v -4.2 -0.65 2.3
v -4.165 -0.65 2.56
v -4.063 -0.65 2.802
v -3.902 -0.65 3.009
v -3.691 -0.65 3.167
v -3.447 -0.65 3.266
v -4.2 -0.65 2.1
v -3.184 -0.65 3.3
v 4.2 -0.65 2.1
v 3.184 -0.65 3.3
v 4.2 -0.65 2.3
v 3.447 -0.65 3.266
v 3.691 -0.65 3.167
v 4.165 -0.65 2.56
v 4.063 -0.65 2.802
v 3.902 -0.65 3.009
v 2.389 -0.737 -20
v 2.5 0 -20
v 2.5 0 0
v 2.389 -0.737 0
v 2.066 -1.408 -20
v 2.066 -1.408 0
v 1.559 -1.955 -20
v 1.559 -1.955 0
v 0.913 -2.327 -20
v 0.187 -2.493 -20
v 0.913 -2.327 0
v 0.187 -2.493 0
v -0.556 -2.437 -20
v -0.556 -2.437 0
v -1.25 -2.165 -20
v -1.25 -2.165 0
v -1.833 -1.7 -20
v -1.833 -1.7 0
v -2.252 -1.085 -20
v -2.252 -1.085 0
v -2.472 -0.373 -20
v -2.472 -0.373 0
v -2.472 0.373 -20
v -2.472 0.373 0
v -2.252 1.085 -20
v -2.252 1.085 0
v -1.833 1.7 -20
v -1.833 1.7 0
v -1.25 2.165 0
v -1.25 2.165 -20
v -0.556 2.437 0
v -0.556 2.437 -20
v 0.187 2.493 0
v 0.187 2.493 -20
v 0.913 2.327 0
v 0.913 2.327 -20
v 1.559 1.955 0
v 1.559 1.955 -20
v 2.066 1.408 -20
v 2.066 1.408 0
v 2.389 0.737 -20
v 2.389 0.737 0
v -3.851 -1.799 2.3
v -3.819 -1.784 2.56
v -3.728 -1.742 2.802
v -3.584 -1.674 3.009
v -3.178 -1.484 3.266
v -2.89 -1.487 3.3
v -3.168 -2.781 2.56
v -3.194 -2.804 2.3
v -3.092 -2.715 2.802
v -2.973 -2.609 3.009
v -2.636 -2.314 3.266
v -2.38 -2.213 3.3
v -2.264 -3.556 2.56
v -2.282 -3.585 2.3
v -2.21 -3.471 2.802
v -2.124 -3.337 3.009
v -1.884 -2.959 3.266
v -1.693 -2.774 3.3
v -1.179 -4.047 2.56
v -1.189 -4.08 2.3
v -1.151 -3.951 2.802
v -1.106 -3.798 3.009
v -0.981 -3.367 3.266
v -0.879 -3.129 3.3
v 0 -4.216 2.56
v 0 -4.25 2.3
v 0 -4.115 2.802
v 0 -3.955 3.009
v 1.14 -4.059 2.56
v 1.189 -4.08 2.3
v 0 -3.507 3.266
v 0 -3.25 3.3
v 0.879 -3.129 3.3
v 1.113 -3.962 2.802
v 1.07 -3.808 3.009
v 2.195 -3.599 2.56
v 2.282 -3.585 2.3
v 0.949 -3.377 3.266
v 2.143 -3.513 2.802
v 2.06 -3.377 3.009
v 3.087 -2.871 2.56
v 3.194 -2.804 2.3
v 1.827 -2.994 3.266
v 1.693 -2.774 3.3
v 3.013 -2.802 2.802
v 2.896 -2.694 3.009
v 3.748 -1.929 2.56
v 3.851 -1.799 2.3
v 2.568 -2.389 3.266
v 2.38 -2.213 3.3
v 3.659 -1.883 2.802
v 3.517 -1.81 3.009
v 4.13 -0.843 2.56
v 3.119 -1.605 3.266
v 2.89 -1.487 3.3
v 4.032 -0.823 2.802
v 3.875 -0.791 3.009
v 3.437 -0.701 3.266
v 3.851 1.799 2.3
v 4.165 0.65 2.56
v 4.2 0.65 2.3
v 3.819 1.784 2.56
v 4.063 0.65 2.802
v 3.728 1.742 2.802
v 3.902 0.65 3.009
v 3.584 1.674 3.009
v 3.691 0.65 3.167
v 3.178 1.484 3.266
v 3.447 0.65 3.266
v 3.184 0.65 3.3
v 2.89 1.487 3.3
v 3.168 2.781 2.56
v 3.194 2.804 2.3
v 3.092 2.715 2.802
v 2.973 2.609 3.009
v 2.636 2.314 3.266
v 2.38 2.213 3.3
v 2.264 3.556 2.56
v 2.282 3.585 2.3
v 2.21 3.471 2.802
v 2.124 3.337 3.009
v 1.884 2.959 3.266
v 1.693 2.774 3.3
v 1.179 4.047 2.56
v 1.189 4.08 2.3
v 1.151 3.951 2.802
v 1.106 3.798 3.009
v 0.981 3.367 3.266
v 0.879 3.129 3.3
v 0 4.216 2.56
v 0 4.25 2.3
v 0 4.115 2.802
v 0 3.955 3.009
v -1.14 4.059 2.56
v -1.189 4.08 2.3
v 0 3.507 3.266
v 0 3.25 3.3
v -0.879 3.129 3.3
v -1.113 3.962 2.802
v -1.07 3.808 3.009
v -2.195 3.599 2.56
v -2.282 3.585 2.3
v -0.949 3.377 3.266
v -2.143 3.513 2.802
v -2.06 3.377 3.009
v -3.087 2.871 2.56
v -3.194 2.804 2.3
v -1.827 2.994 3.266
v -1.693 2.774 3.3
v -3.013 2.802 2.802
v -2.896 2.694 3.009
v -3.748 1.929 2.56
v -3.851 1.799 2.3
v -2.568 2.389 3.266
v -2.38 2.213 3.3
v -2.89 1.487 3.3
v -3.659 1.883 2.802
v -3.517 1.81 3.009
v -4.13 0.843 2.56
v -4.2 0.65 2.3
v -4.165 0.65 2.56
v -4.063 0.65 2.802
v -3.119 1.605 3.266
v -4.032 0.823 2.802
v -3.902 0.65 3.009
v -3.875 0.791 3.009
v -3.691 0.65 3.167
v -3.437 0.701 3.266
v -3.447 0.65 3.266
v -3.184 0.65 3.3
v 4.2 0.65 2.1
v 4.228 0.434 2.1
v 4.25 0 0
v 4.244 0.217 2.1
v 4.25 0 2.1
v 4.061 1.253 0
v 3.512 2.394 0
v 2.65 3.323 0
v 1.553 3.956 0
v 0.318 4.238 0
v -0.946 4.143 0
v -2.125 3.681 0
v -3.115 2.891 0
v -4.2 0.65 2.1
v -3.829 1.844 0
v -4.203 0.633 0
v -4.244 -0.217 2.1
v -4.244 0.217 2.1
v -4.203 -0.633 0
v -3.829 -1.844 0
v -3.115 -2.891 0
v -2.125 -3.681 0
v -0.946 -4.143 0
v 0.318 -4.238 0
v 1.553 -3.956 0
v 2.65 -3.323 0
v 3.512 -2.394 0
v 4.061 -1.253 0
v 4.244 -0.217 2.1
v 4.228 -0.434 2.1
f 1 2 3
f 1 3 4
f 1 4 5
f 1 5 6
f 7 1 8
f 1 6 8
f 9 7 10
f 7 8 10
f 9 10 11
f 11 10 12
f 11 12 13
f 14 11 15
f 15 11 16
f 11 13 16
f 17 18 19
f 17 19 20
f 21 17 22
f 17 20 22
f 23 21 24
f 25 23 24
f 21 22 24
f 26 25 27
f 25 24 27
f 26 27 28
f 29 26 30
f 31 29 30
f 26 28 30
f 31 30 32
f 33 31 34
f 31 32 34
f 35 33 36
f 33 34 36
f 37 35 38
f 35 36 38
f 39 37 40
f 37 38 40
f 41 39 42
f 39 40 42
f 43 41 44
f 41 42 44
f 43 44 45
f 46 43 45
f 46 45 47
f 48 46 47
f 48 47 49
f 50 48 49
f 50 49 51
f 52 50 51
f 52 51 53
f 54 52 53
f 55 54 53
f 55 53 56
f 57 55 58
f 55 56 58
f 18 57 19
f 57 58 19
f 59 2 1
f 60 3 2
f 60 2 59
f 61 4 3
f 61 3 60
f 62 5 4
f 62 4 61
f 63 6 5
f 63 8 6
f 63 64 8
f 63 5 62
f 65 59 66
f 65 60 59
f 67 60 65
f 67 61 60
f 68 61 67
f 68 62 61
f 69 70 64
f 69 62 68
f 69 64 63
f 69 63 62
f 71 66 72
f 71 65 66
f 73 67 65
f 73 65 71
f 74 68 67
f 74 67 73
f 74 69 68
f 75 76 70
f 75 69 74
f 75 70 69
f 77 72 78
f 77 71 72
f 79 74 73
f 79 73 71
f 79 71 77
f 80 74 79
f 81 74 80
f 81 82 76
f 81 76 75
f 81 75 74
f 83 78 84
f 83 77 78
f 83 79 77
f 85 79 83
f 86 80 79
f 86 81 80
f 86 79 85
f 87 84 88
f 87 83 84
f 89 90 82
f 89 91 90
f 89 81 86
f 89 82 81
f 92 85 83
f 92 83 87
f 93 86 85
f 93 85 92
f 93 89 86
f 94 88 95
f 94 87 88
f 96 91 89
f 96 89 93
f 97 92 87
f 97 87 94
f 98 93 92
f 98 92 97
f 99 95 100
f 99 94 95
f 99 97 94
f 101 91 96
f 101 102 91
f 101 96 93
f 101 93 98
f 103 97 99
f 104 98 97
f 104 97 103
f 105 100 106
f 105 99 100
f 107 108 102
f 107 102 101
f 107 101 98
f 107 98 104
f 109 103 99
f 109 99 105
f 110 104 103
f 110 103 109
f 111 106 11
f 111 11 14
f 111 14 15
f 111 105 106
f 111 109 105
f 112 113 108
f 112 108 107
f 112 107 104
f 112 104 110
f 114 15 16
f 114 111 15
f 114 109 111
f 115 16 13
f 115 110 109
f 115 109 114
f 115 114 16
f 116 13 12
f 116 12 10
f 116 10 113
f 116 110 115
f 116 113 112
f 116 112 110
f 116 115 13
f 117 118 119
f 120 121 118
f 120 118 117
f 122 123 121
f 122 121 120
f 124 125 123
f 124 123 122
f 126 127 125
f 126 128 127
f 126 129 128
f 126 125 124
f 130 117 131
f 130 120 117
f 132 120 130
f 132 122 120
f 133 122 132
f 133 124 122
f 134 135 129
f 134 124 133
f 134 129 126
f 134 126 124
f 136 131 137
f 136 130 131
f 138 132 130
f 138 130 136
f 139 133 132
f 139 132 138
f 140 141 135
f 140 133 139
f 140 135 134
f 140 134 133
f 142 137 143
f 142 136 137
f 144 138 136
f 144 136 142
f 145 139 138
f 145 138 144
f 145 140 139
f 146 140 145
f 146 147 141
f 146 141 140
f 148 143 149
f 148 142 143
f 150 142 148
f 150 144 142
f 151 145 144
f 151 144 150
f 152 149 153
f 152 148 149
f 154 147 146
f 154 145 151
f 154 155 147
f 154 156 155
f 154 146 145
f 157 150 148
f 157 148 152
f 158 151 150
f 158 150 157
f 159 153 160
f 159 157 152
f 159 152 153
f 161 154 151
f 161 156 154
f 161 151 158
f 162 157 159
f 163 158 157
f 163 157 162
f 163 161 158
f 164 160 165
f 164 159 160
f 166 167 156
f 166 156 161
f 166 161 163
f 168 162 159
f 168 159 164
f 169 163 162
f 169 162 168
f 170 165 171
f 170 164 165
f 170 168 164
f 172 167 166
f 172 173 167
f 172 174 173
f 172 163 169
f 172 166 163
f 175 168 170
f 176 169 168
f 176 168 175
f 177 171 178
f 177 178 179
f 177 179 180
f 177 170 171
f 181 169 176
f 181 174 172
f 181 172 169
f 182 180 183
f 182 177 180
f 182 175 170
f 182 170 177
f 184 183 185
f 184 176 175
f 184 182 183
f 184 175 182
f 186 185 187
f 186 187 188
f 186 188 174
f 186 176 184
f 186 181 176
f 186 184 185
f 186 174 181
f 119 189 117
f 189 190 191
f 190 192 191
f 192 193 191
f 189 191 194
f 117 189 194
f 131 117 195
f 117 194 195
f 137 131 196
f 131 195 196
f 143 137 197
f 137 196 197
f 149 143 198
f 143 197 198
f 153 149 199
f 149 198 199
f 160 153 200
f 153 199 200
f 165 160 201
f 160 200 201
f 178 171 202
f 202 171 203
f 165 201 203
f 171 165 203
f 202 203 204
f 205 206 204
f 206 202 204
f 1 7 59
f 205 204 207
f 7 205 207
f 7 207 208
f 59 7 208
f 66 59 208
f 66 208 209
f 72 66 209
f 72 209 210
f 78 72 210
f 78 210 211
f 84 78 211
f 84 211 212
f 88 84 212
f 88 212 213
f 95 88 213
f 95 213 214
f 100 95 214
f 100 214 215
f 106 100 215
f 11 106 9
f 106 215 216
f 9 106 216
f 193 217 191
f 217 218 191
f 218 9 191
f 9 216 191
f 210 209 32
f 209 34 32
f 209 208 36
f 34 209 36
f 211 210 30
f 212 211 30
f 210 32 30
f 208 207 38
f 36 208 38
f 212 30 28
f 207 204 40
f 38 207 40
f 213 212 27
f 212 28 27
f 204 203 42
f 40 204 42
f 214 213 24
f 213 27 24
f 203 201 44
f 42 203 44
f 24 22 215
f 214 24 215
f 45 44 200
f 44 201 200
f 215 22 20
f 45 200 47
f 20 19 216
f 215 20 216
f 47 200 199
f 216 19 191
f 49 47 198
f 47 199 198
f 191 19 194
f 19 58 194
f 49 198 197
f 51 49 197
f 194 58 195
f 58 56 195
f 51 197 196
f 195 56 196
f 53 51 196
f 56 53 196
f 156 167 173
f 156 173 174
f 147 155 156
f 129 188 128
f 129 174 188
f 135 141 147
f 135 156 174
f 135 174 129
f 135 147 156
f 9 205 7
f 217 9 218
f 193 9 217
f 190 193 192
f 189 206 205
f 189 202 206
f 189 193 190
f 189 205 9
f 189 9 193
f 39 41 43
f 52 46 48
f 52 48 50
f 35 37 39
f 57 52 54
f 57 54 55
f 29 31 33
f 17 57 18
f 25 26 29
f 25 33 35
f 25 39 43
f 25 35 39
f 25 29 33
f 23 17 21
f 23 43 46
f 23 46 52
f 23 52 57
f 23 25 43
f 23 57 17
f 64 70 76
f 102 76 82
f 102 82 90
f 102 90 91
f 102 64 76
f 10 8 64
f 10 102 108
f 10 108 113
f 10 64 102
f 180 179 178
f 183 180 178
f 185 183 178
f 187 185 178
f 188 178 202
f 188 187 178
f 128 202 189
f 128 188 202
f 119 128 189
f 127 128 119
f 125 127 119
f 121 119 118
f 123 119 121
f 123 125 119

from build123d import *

# Parameters (mm, degrees)
F0_R     = 4.25
F1_DEPTH = 3.3
F2_R     = 2.5
F3_DEPTH = 20
F4_W     = 12.181458
F4_H     = 1.3
F5_DEPTH = 1.2
F6_R     = 1


with BuildPart() as f1:
    # F0 (on Top) → F1 (new body)
    with BuildSketch(Plane.XY):
        Circle(F0_R)
    extrude(amount=F1_DEPTH)

    # F2 (on face) → F3 (join)
    with BuildSketch(Plane(origin=(0, 0, 0), x_dir=(1, 0, 0), z_dir=(0, 0, -1))):
        Circle(F2_R)
    extrude(amount=F3_DEPTH)

    # F4 (on face) → F5 (cut)
    with BuildSketch(Plane.XY.offset(3.3)):
        Rectangle(F4_W, F4_H)
    extrude(amount=-F5_DEPTH, mode=Mode.SUBTRACT)

    # F6
    f6_edges = [f1.edges().sort_by_distance(p)[0] for p in [
        (0, -4.25, 3.3),
        (0, 4.25, 3.3),
    ]]
    fillet(f6_edges, radius=F6_R)


solid = f1.part
